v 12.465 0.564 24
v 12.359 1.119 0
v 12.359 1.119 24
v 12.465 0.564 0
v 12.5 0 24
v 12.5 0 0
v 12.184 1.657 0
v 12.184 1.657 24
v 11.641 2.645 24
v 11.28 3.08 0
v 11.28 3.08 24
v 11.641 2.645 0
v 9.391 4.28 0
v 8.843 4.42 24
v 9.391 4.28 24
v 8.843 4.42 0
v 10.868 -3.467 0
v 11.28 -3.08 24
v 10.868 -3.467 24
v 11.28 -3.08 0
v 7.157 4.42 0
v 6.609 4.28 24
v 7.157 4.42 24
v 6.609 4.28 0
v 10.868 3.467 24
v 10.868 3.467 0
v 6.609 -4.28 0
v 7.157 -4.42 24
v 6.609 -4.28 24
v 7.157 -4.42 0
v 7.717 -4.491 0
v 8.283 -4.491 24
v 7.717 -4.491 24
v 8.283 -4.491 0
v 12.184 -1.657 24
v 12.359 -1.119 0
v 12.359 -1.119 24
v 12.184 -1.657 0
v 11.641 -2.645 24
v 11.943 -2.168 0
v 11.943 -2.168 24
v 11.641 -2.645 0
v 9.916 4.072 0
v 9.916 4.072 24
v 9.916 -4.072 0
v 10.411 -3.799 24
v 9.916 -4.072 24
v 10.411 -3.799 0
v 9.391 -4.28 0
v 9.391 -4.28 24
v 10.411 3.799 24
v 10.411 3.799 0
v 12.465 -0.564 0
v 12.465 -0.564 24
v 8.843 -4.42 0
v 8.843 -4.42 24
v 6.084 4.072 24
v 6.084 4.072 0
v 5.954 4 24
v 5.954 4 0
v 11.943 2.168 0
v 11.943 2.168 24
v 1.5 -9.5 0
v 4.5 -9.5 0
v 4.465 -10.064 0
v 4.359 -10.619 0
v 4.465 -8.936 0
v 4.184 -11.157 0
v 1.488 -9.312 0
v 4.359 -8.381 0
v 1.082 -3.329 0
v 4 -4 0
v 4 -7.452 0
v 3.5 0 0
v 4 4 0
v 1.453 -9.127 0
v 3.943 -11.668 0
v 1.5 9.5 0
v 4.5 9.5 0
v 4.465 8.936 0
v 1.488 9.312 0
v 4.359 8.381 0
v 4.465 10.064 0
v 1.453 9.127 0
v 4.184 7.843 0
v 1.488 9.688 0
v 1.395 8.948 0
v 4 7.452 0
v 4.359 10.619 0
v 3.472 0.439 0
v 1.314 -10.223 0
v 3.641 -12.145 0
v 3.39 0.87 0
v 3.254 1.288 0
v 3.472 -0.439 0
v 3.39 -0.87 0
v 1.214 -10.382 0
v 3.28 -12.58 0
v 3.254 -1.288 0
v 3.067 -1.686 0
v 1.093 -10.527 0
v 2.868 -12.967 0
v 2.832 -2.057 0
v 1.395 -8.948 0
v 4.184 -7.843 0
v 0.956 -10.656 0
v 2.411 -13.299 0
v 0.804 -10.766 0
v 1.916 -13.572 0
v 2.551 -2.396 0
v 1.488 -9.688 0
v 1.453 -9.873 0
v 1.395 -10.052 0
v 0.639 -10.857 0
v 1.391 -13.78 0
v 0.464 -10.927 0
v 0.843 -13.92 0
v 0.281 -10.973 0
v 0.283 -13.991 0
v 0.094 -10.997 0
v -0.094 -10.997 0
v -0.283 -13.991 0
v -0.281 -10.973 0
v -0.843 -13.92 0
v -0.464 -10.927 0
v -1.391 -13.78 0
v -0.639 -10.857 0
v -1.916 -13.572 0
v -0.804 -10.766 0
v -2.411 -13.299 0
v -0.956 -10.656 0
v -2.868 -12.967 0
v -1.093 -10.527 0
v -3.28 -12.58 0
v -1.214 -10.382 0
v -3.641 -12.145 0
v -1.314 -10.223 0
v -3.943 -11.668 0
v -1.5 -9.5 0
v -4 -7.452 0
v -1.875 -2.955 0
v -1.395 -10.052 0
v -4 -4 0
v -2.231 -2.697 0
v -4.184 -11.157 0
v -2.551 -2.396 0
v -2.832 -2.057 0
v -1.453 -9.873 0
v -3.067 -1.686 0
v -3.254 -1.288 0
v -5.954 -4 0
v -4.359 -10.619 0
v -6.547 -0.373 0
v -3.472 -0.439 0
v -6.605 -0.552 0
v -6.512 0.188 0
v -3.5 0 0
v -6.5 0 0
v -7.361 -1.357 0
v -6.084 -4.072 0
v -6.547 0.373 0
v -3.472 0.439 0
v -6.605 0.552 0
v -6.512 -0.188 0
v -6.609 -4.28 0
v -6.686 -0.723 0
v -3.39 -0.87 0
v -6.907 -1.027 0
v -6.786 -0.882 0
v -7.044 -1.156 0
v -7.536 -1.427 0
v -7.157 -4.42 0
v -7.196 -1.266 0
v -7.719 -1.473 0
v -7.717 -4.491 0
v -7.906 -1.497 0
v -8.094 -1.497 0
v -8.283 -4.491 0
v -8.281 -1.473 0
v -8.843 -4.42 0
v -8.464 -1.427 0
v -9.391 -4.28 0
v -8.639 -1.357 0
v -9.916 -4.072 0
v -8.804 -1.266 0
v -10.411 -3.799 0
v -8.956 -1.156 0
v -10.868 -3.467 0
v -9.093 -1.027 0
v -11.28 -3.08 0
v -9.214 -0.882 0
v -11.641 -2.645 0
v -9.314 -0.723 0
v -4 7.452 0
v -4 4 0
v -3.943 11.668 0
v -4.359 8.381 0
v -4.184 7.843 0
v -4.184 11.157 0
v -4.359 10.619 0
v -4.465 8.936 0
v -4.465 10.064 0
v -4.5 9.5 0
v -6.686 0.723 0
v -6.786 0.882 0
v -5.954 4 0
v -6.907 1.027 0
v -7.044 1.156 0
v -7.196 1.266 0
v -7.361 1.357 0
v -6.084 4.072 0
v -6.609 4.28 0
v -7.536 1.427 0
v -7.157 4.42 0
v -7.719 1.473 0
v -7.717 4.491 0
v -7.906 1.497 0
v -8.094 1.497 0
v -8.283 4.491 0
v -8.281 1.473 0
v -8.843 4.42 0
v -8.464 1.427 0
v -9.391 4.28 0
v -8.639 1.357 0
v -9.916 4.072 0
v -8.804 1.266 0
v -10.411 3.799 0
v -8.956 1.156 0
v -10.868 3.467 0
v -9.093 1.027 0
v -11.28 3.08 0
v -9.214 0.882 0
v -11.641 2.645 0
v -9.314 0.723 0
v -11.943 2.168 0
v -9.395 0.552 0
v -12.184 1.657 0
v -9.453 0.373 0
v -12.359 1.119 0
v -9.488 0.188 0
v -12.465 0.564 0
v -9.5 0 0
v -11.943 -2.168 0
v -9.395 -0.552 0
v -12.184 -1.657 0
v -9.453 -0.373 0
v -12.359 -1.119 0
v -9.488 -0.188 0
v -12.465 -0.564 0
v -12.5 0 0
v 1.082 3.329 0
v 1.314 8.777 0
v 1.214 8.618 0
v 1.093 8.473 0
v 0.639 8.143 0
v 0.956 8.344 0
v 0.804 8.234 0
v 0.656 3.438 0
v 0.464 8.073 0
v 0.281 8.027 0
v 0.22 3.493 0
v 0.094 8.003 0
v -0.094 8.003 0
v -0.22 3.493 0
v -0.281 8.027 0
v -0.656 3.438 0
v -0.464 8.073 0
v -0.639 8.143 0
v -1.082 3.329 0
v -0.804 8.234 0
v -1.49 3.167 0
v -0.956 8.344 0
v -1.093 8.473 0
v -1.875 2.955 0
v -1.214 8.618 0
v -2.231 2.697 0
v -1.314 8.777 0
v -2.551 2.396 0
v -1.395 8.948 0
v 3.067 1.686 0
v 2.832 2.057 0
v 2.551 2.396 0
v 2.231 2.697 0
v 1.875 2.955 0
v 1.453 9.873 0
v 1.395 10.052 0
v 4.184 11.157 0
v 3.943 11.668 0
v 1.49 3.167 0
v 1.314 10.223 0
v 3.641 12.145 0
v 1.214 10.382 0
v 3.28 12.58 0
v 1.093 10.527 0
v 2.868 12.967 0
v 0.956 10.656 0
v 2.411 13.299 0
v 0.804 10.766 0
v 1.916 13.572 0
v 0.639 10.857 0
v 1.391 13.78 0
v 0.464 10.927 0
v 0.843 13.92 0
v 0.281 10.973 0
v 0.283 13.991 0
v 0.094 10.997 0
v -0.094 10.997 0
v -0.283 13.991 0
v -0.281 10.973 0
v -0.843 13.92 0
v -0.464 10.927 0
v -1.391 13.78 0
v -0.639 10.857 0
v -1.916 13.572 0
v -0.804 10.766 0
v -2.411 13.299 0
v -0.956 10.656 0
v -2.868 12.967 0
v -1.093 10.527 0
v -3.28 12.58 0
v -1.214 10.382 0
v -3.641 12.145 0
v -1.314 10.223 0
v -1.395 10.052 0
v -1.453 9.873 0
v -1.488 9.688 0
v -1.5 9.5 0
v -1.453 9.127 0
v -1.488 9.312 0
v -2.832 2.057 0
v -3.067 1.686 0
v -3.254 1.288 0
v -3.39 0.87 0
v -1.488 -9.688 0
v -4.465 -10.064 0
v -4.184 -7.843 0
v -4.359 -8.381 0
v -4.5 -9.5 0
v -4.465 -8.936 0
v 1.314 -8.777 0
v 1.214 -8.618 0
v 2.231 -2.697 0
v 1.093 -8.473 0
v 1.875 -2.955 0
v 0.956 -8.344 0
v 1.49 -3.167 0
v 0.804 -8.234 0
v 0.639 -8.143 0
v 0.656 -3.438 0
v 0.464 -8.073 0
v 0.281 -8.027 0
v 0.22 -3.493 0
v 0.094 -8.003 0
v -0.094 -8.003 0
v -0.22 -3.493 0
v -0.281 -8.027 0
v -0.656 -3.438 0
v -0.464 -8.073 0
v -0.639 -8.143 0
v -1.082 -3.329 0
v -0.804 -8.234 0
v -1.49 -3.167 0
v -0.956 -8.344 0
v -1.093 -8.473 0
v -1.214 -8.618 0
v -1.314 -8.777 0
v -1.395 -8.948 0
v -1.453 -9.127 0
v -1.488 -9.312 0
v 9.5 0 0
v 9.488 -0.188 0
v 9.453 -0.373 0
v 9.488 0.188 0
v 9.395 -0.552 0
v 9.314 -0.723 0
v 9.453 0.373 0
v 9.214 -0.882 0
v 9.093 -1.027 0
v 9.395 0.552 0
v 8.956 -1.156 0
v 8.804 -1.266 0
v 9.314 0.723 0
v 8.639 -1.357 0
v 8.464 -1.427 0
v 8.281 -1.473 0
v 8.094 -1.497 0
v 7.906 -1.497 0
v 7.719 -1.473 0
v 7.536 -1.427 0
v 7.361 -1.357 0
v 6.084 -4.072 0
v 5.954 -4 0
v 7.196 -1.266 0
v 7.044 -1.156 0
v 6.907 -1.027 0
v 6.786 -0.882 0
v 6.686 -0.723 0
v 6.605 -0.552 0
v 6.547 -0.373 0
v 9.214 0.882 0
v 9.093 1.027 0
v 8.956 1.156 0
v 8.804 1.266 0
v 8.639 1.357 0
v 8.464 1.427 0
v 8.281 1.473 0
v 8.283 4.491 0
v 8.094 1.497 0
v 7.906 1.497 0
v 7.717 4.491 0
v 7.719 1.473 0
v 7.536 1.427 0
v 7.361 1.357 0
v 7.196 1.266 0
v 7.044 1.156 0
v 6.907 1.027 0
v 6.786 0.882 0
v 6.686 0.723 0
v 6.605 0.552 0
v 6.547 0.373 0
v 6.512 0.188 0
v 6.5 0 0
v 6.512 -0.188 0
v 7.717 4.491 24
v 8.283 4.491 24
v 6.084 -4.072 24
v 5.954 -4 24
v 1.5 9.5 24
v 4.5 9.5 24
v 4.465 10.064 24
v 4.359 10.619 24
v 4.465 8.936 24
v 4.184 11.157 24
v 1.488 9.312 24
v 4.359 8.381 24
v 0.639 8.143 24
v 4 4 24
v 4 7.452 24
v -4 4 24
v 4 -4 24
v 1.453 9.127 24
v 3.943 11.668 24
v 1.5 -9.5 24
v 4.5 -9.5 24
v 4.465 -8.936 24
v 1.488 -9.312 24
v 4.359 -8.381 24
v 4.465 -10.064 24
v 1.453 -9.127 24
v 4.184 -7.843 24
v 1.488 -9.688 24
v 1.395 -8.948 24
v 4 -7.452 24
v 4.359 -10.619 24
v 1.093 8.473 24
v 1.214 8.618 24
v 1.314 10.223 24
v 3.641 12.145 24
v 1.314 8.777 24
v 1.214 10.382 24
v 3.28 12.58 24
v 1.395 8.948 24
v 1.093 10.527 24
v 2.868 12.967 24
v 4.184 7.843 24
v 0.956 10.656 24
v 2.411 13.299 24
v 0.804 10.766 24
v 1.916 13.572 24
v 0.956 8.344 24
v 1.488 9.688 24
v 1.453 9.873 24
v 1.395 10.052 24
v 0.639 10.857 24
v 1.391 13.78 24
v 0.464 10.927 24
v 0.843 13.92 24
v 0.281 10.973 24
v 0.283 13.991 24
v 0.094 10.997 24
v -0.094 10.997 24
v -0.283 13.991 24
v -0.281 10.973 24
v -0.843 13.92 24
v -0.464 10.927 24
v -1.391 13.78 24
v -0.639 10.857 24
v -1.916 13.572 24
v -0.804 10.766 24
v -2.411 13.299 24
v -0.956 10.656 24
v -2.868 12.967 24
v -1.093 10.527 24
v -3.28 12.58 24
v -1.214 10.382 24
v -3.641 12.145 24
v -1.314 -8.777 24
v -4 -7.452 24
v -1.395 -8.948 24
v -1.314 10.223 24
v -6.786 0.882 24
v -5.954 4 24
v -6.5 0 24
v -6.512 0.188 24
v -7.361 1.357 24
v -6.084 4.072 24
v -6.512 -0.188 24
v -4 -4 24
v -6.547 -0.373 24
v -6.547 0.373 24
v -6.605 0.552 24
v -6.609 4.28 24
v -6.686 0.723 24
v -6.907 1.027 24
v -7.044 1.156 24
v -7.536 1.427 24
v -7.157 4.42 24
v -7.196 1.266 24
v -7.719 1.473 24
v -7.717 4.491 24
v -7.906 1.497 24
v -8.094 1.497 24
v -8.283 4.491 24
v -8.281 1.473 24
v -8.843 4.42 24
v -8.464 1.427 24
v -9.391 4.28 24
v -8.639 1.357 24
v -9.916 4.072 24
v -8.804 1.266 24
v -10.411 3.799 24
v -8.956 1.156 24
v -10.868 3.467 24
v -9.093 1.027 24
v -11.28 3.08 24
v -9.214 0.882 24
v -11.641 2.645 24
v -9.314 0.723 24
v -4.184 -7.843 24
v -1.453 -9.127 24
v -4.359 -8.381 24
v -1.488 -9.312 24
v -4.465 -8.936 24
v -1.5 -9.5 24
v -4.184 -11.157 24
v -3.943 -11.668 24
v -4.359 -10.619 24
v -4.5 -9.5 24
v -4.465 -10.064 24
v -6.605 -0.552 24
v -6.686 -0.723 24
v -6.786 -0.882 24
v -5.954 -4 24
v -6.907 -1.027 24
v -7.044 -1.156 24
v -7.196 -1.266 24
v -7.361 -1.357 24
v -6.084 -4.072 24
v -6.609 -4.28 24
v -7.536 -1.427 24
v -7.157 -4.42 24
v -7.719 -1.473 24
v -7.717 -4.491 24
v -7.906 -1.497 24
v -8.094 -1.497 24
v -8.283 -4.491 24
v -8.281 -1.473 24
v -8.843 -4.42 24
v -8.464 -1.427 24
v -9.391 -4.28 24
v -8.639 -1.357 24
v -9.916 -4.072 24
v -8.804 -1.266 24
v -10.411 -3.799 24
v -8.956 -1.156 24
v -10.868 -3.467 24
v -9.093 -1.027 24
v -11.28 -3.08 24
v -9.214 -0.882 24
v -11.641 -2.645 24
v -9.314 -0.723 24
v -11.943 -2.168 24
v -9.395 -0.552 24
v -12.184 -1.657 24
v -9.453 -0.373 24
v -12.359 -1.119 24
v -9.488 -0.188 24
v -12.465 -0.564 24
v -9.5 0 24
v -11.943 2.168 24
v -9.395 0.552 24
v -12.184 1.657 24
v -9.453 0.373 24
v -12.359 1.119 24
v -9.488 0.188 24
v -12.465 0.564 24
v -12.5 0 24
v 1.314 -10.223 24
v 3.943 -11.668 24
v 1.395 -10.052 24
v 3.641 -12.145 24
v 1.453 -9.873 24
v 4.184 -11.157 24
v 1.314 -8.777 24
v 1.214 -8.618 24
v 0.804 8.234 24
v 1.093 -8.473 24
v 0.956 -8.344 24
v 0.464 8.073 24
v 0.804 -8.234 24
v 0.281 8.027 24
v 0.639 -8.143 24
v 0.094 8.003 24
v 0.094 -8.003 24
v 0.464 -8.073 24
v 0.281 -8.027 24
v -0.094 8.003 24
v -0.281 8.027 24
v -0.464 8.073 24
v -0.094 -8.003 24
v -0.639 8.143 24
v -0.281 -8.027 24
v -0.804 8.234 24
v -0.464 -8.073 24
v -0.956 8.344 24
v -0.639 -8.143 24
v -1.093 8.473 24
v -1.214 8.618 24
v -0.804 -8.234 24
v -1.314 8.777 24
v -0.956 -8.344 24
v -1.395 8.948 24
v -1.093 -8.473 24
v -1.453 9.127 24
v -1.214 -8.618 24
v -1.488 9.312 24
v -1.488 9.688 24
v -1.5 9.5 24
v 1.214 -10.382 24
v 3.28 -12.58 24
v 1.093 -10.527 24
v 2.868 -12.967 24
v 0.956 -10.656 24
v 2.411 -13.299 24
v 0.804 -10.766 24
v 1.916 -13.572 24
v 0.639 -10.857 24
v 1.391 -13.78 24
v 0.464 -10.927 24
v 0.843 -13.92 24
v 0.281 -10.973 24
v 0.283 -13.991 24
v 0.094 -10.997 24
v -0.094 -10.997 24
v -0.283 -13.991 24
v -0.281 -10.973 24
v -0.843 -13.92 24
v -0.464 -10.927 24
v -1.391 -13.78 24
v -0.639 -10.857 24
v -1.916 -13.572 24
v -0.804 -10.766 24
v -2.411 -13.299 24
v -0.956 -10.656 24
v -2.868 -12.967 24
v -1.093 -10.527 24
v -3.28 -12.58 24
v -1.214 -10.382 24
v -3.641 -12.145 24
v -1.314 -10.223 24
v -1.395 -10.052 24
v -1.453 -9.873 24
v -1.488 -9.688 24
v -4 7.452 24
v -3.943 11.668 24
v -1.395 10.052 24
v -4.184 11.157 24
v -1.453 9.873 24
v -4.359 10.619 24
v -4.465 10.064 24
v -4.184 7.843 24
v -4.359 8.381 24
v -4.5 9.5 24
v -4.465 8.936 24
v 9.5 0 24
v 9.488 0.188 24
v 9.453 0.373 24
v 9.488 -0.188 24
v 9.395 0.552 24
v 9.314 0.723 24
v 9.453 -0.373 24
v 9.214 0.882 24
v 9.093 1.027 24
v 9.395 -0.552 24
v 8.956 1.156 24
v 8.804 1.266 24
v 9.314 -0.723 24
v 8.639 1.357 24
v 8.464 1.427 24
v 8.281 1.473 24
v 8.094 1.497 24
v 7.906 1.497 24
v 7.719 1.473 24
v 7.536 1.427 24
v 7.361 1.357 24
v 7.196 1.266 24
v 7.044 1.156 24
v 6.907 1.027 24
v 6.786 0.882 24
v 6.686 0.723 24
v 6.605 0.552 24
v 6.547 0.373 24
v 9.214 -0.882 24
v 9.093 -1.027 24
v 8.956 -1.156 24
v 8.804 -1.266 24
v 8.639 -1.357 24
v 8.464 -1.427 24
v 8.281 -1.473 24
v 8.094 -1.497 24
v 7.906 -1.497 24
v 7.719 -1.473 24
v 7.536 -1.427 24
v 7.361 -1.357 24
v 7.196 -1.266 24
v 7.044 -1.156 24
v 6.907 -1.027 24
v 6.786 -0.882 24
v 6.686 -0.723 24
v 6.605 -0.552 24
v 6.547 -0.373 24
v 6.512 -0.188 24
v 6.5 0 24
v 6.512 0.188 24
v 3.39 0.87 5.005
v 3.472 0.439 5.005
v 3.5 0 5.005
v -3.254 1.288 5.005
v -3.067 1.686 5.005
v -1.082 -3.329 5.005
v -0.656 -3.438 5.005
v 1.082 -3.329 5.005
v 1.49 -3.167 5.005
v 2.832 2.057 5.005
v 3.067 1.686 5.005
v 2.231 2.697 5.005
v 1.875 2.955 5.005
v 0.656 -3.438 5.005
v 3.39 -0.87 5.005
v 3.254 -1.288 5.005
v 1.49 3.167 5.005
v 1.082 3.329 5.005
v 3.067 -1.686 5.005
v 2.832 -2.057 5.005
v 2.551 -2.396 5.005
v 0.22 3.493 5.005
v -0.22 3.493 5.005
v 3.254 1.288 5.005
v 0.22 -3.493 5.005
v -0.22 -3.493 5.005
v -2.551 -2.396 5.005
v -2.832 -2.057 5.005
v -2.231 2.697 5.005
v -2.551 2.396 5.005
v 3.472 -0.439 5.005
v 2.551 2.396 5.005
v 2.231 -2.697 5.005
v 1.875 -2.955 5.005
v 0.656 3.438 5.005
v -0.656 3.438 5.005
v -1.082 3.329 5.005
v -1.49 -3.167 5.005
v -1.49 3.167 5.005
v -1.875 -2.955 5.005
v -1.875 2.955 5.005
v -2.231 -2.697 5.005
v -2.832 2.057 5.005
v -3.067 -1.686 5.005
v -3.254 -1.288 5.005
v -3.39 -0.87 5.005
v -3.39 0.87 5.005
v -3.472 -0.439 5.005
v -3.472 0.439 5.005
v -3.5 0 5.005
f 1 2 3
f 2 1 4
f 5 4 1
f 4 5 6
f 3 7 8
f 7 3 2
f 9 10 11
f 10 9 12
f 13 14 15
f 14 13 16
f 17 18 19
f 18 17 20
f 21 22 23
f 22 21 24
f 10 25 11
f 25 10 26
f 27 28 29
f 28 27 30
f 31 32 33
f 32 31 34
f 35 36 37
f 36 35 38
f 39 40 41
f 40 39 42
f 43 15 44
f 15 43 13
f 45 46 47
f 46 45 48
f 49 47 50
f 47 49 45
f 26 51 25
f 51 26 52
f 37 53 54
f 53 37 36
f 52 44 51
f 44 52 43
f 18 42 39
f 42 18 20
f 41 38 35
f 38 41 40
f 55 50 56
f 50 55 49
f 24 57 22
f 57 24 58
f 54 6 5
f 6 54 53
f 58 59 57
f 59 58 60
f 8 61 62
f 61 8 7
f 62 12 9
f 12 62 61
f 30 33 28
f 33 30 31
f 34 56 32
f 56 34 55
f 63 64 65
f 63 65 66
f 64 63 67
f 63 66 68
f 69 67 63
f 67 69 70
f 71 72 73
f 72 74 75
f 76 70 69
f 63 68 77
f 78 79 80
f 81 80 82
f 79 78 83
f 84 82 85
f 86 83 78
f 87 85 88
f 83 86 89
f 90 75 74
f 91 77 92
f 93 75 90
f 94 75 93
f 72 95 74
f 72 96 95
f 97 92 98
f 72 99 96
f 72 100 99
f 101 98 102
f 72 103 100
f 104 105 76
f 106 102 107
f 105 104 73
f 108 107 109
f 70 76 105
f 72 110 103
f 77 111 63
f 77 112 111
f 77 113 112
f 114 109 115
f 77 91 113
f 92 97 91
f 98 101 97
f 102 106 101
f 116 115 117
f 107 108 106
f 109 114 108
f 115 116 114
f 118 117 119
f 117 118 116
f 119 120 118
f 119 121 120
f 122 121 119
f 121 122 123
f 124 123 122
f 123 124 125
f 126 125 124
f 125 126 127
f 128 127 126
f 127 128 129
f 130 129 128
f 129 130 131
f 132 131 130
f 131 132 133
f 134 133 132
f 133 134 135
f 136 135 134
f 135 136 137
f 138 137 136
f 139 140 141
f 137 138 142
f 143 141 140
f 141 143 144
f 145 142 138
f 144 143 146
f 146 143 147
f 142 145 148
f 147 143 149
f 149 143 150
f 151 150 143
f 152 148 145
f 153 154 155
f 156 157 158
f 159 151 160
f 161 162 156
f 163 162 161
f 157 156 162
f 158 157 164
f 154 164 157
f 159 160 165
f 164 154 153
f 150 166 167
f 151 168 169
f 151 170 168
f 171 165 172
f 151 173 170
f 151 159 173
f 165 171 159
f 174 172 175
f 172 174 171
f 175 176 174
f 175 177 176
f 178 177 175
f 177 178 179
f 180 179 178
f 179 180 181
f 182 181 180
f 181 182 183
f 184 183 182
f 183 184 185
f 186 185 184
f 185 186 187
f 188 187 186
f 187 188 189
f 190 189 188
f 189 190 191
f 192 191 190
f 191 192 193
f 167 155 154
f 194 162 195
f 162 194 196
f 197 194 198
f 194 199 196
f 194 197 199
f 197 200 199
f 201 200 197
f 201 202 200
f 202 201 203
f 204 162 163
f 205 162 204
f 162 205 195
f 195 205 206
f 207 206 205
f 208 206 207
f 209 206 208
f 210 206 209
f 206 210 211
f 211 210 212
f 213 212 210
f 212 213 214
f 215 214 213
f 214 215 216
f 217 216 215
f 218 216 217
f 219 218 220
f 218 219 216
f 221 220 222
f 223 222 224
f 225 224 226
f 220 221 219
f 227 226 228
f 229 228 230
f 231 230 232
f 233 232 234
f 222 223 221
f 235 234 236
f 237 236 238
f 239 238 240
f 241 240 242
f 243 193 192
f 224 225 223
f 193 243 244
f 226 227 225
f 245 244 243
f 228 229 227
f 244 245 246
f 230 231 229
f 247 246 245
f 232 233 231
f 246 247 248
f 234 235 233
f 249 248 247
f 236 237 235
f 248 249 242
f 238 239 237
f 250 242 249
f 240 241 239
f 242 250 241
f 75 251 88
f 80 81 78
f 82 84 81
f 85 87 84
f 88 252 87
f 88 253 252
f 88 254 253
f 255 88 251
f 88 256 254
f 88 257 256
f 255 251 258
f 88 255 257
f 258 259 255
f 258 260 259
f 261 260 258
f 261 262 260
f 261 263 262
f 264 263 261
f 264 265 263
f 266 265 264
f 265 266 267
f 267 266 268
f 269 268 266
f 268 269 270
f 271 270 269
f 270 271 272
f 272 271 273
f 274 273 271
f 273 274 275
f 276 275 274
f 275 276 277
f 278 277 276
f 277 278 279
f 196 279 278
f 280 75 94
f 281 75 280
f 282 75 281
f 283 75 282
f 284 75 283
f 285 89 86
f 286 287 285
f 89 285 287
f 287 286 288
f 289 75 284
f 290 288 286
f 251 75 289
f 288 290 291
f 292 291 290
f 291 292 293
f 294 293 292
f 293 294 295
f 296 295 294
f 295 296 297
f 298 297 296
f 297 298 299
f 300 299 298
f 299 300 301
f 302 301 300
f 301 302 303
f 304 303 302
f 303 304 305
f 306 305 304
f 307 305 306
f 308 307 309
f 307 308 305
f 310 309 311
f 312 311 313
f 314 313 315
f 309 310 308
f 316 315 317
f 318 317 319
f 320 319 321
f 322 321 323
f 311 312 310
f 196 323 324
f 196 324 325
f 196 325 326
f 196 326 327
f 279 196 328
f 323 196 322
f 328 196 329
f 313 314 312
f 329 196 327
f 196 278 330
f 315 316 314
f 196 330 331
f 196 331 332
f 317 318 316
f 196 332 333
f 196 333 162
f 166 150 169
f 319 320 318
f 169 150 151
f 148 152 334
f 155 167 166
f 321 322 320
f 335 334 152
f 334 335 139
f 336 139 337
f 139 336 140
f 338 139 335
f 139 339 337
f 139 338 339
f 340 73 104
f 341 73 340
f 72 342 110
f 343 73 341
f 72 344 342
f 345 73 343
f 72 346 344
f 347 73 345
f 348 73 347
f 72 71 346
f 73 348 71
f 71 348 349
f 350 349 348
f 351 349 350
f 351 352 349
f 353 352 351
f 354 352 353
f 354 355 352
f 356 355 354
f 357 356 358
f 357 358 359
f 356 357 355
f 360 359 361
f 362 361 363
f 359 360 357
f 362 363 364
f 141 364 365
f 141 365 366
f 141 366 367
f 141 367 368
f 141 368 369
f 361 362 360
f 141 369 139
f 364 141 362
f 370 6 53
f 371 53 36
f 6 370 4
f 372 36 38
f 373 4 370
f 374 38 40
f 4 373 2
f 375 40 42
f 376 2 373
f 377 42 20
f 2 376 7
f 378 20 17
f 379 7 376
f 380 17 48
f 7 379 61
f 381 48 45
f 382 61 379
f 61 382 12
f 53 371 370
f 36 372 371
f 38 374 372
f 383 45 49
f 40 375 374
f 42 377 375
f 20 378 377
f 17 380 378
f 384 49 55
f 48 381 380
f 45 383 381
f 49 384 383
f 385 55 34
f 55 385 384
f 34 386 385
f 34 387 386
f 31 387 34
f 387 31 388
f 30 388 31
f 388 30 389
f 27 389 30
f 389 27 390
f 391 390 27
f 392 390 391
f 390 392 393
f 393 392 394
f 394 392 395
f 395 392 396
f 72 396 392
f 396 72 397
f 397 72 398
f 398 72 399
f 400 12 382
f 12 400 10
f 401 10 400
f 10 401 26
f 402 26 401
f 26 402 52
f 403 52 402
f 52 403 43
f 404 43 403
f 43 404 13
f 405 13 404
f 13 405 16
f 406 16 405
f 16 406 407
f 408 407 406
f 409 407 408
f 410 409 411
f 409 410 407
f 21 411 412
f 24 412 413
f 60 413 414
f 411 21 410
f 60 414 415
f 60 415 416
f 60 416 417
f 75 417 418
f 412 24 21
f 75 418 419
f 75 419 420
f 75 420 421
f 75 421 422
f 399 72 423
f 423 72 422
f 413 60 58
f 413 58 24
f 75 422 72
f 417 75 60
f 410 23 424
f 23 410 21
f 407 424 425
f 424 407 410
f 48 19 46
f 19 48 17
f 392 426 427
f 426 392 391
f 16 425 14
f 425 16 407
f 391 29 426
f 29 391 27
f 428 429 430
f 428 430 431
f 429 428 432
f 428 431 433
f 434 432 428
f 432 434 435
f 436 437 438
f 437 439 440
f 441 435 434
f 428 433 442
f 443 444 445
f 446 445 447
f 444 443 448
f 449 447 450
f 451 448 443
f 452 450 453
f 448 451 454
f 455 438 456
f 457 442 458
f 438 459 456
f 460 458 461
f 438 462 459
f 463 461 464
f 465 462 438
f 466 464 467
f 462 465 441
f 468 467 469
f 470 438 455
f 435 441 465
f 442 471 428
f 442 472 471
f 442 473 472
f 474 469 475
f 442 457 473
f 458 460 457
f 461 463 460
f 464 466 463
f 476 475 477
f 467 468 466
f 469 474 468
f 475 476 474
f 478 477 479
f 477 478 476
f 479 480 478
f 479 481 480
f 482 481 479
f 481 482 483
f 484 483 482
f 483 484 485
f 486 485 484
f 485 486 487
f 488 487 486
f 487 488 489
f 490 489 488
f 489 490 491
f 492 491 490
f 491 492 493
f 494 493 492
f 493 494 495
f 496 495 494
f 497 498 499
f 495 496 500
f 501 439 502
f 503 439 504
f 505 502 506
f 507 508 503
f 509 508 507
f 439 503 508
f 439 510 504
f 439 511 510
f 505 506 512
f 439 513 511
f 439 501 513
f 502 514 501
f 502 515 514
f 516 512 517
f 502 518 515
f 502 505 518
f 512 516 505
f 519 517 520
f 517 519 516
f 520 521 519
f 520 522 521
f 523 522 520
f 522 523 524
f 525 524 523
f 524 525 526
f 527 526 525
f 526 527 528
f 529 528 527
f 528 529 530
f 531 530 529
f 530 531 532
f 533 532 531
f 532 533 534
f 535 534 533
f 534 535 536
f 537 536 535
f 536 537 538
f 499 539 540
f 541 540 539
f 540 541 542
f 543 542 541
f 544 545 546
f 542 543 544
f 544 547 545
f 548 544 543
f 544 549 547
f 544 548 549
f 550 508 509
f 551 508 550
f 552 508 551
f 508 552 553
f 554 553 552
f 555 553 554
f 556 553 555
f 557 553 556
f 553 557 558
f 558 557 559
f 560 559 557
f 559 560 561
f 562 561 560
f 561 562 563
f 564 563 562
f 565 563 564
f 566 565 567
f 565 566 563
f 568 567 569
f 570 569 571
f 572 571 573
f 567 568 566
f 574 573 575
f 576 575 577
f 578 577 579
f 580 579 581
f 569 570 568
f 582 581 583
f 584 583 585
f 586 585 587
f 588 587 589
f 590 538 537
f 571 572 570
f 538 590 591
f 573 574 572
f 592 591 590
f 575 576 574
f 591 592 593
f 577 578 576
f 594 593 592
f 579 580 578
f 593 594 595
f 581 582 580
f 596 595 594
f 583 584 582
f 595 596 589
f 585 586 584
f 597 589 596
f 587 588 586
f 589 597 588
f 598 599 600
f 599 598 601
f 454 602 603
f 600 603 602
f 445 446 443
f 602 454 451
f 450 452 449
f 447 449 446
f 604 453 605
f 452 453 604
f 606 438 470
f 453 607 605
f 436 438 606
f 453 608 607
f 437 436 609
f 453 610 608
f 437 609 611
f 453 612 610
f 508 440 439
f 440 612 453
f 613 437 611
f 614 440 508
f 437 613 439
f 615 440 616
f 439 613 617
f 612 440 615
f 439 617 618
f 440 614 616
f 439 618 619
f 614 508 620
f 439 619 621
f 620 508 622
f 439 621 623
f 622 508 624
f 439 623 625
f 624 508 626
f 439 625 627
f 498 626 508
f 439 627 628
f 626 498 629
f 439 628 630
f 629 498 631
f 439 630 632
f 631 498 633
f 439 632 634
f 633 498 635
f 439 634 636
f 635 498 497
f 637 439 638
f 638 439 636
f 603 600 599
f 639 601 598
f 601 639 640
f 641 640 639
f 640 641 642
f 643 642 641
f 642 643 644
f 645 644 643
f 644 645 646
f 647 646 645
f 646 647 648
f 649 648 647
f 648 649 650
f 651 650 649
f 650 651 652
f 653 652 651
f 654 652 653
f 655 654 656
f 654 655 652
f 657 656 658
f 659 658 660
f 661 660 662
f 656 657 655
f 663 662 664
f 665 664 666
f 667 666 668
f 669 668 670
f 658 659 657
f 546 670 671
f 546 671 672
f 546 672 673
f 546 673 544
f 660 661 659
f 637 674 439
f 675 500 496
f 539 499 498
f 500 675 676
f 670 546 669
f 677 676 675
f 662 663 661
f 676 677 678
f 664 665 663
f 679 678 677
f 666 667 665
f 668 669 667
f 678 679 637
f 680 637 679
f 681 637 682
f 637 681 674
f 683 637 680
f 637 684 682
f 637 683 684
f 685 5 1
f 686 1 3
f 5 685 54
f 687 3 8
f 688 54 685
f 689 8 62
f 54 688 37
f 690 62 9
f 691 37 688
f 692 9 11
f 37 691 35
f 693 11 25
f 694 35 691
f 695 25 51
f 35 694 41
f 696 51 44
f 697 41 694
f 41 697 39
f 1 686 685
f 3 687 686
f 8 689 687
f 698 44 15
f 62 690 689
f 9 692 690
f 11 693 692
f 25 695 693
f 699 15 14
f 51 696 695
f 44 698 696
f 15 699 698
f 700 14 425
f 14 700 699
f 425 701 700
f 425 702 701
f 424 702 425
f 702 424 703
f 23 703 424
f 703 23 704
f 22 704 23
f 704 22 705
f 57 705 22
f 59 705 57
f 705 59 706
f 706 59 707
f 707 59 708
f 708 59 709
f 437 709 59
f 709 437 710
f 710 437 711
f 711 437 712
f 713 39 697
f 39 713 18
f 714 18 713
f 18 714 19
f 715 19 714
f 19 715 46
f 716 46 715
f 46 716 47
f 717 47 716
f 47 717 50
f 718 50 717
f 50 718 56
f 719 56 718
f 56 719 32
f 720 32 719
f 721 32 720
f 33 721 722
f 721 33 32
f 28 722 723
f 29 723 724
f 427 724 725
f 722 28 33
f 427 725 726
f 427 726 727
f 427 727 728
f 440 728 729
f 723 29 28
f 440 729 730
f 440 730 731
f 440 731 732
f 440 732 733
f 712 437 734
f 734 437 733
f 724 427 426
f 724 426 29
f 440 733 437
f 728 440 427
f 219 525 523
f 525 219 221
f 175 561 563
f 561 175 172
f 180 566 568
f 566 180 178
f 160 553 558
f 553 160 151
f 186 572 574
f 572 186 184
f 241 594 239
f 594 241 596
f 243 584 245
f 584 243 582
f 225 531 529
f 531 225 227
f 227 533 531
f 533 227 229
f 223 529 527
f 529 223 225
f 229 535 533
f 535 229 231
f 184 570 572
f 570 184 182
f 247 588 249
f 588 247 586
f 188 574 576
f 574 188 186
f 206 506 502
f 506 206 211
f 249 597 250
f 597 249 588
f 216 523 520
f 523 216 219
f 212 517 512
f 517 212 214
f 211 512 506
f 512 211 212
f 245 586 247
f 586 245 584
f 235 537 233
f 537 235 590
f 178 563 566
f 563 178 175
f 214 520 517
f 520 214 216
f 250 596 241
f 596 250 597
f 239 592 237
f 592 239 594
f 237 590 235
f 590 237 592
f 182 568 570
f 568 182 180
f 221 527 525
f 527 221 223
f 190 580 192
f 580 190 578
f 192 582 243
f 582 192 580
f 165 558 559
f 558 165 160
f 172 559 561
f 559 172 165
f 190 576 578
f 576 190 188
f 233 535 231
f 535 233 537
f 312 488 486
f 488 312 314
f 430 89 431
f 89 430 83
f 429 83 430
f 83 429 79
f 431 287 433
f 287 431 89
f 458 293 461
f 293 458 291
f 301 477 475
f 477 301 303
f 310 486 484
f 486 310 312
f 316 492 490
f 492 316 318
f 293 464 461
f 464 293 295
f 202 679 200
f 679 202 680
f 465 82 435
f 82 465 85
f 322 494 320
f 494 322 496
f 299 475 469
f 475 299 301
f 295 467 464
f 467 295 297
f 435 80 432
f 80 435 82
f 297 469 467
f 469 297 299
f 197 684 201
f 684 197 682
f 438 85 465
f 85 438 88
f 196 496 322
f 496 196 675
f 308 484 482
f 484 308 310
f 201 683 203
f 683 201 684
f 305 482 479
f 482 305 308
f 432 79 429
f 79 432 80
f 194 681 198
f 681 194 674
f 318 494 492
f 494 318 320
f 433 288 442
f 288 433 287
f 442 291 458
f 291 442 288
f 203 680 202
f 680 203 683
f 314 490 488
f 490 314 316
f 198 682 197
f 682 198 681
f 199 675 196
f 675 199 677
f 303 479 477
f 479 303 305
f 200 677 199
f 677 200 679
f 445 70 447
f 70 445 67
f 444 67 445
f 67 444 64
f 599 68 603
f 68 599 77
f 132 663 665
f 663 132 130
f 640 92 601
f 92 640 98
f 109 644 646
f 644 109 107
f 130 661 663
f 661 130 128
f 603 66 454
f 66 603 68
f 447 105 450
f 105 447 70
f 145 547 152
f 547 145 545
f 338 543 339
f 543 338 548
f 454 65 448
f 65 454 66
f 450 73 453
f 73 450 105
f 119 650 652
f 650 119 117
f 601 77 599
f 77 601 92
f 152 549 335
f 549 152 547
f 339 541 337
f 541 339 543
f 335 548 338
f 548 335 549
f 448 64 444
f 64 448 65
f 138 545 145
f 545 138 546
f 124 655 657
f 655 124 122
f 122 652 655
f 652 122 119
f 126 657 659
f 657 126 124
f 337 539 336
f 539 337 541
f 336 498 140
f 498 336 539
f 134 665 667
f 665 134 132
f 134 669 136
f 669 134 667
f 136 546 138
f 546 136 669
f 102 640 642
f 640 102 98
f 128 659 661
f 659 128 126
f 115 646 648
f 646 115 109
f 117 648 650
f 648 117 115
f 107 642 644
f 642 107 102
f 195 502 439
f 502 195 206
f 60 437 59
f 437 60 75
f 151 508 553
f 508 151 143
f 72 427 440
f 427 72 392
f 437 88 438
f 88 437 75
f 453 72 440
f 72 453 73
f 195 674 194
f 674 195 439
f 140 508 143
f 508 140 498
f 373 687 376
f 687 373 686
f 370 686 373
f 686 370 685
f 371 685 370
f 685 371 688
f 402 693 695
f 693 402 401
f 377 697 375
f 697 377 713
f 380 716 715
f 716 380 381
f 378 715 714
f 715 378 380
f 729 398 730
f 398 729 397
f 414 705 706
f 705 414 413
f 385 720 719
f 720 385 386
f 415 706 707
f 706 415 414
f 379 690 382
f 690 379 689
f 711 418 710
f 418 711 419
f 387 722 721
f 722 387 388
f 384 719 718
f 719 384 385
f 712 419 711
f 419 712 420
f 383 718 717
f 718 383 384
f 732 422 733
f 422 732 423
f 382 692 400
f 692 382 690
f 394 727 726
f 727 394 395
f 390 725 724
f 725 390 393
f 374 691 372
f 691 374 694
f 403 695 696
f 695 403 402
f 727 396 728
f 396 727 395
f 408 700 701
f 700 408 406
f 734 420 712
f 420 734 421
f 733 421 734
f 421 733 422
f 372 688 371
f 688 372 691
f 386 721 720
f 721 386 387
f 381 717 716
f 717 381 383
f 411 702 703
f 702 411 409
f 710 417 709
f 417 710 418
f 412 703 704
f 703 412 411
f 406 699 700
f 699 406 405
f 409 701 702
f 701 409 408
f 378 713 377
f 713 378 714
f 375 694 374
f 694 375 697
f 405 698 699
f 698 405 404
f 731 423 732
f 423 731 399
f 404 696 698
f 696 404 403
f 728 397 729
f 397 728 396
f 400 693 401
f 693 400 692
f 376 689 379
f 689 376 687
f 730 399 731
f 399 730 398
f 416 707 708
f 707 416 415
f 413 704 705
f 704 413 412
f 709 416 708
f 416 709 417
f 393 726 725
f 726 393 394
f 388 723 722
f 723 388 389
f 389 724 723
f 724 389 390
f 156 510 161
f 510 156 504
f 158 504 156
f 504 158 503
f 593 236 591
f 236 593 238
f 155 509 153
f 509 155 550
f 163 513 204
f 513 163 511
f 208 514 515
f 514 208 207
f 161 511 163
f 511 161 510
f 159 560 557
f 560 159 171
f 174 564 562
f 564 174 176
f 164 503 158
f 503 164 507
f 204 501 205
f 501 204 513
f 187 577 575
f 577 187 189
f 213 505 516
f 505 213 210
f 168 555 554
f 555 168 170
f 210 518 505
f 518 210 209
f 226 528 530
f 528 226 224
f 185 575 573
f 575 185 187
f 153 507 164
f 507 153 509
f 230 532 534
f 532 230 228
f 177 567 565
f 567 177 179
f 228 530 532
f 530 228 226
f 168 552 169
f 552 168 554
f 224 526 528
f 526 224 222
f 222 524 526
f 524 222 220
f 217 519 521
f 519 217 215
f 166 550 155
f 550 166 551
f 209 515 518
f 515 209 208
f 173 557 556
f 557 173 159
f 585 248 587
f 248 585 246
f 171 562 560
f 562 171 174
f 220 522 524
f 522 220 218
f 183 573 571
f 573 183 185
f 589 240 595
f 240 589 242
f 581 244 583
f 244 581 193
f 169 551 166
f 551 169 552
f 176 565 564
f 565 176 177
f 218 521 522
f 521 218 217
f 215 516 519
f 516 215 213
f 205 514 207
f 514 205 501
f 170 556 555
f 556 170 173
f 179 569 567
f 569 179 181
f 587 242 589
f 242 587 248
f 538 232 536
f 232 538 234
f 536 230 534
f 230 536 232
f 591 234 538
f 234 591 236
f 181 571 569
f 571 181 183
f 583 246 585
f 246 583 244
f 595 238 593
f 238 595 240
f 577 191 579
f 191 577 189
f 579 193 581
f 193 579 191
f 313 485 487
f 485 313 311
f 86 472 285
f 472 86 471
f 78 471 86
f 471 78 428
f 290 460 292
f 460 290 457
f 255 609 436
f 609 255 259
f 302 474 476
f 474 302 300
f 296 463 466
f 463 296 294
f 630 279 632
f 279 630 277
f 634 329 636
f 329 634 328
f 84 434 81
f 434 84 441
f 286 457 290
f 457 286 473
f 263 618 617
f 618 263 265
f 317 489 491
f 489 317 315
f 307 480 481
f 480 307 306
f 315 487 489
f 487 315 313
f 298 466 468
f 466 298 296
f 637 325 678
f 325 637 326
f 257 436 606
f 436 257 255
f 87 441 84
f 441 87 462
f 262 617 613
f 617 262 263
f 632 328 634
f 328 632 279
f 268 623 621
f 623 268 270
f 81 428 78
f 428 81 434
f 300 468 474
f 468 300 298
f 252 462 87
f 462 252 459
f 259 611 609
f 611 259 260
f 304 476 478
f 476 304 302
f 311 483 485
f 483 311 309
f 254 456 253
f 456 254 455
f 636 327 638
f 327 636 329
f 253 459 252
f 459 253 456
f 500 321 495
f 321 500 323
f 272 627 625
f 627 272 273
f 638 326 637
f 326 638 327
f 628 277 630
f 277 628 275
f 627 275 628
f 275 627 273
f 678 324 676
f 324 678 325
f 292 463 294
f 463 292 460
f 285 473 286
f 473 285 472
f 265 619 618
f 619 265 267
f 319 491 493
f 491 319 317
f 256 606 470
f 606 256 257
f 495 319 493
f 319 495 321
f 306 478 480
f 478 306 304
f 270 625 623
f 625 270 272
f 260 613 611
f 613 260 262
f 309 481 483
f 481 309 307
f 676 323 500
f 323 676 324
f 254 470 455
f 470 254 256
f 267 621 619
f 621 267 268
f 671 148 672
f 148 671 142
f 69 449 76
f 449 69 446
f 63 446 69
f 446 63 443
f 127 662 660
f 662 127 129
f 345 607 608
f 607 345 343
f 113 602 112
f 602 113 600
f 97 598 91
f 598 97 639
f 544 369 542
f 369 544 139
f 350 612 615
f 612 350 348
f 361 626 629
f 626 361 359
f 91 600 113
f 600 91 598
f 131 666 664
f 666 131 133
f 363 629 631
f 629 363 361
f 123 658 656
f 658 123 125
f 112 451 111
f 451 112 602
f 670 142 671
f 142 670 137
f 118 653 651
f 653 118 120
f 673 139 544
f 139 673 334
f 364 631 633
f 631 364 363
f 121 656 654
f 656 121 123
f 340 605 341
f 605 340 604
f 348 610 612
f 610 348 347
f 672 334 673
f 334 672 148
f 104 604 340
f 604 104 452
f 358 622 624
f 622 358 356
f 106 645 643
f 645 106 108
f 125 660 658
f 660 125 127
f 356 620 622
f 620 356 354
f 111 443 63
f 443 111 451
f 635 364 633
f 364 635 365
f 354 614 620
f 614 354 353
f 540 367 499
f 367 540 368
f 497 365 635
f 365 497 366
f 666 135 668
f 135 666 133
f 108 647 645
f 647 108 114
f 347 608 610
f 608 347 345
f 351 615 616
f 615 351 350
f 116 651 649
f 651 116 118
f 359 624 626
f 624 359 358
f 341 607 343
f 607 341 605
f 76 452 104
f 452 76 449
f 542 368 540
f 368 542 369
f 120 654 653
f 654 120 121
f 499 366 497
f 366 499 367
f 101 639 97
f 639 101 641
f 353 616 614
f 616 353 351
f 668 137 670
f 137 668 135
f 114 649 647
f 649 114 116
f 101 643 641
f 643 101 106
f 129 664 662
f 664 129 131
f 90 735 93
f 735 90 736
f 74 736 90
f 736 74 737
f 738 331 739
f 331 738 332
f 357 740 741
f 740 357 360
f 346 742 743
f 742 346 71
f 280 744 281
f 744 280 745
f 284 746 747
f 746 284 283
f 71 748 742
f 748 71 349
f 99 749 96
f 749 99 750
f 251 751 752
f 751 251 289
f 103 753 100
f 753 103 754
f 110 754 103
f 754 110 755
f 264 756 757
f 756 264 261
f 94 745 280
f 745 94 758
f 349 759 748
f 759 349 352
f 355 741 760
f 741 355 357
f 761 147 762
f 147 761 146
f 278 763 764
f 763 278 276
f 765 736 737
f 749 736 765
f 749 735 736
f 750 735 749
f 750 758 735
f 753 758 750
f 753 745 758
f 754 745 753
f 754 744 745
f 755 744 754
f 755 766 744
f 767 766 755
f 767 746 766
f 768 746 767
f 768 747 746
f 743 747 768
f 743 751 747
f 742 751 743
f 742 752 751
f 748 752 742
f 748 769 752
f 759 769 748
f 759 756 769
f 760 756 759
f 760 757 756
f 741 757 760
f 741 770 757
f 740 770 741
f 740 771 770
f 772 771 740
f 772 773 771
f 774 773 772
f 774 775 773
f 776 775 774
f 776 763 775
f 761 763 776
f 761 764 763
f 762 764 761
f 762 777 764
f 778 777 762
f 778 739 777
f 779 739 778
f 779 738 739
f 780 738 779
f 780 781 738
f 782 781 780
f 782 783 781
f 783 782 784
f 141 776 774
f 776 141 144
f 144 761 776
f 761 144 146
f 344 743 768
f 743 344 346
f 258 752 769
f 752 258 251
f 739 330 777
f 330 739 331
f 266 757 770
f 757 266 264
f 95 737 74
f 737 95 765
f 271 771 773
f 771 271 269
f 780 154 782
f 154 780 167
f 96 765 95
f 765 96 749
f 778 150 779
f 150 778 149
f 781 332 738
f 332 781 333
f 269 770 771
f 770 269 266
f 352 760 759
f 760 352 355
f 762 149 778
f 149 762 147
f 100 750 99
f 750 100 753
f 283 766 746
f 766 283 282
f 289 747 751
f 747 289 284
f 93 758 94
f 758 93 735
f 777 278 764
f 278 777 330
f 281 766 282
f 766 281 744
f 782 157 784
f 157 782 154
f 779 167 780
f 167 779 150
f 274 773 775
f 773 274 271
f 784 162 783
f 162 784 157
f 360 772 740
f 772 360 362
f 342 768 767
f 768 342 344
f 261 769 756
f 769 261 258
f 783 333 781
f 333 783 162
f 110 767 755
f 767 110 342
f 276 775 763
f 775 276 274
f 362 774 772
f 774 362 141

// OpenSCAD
//parametric motor mount spacer

hole1Spacing=16;
hole2Spacing=19;
holeDiameter=3;

//width of cross 
mountWidth=8;

//strength around mounting holes in mm
minimumStrength=3;

//Shaft Hole
shaftDiameter=7;

//lenght of hole required for motor shaft at base of motor.
shaftDepth=5;

mountHeight=24;

difference()
{
union()
{
//cylinder right
translate([hole1Spacing/2,0,mountHeight/2])
cylinder(h=mountHeight,d=holeDiameter+minimumStrength*2,center=true);

//cylinder left
translate([-hole1Spacing/2,0,mountHeight/2])
cylinder(h=mountHeight,d=holeDiameter+minimumStrength*2,center=true);

//cylinder top
translate([0,hole2Spacing/2,mountHeight/2])
cylinder(h=mountHeight,d=holeDiameter+minimumStrength*2,center=true);

//cylinder bottom
translate([0,-hole2Spacing/2,mountHeight/2])
cylinder(h=mountHeight,d=holeDiameter+minimumStrength*2,center=true);


translate([0,0,mountHeight/2])
cube([hole1Spacing,mountWidth,mountHeight],center=true);

translate([0,0,mountHeight/2])
cube([mountWidth,hole2Spacing,mountHeight],center=true);
}

{
//hole1 right
translate([hole1Spacing/2,0,mountHeight/2])
cylinder(h=mountHeight+tolerance,d=holeDiameter,center=true);

//hole1 left
translate([-hole1Spacing/2,0,mountHeight/2])
cylinder(h=mountHeight+tolerance,d=holeDiameter,center=true);

//hole2 top
translate([0,hole2Spacing/2,mountHeight/2])
cylinder(h=mountHeight+tolerance,d=holeDiameter,center=true);

//hole2 bottom
translate([0,-hole2Spacing/2,mountHeight/2])
cylinder(h=mountHeight+tolerance,d=holeDiameter,center=true);

//shaft hole
translate([0,0,shaftDepth/2])
cylinder(h=shaftDepth+tolerance,d=shaftDiameter,center=true);

}
}

/* [Hidden] */
$fn=50;
tolerance=.01;
